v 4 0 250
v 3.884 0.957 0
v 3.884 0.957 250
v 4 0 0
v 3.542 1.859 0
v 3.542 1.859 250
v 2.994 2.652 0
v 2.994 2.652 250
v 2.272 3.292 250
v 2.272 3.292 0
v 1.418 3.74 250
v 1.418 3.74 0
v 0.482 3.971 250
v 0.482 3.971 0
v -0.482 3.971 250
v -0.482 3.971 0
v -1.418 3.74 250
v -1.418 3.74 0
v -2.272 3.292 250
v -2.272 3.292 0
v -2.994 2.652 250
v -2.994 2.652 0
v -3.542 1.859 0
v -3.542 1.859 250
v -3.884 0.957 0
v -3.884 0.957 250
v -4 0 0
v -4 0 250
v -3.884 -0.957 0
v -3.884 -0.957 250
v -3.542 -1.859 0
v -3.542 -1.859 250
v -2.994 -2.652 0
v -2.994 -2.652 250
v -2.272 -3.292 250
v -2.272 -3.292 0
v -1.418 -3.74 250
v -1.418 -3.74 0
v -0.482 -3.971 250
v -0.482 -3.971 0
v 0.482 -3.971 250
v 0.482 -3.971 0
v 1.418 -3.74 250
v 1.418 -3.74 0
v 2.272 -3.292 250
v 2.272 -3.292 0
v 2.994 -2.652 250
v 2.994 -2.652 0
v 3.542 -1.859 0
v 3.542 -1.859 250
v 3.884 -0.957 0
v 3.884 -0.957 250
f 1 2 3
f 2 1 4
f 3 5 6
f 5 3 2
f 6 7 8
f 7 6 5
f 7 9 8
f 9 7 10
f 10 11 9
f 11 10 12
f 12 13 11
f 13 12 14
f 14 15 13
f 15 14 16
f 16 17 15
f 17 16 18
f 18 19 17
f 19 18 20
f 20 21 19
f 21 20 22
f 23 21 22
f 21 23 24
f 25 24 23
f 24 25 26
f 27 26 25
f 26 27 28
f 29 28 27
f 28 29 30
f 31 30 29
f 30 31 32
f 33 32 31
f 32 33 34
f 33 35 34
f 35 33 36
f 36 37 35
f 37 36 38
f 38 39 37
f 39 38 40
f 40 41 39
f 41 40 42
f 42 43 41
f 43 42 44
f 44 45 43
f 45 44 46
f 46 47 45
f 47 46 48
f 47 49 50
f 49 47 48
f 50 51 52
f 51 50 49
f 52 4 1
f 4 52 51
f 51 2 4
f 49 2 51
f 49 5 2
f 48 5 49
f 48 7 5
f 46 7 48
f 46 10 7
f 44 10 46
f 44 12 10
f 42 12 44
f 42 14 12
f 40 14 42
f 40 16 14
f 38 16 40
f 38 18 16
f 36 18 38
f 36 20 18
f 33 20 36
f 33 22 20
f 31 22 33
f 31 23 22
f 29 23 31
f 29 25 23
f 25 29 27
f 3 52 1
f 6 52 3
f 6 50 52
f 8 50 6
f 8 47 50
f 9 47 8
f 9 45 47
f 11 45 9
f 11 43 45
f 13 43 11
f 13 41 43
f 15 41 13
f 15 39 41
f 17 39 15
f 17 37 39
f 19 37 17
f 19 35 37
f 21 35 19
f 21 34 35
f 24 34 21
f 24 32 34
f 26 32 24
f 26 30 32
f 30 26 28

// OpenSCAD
// file: ../config.scad
/*
 * config
 *
 * Copyright 2013 <b@Zi.iS>
 * License CC BY 3.0
 */

$fa = 1;
$fs = 1;
preview = 1;

// preview colors
color_steal = [.8,.8,.8];
color_wood = [.3,.3,0];
color_print = [0,.8,0];

// metric bolt sizes
function m_hole(size) = size*1.1/2;
function m_pilot(size) = size*.9/2;

mounting_bolt = 3;

// slightly move and slightly elongate objects in preview to overcome scad rounding errors
module e() {
	if(preview==1) {
		translate([
			0,
			0,
			-.1
		]) {
			scale([
				1,
				1,
				1.1
			]) {
				child();
			}
		}
	} else {
		child();
	}
}

module m_washer(
	size = 3
) {
	color(color_steal) {
		difference() {
			cylinder(
				r = size/2*2,
				h = size*.2
			);
			e() cylinder(
				r = size/2,
				h = size*.2
			);
		}
	}
	translate([
		0,
		0,
		size*.2
	]) {
		child();
	}
}

module m_nut(
	size = 3
) {
	color(color_steal) {
		difference() {
			cylinder(
				r = size*1.8/2,
				h = size*.8,
				$fn = 6
			);
		}
	}
	translate([
		0,
		0,
		size*.8
	]) {
		child();
	}
}

module m_nylock(
	size = 3
) {
	color(color_steal) {
		difference() {
			cylinder(
				r = size*1.8/2,
				h = size,
				$fn = 6
			);
		}
	}
	translate([
		0,
		0,
		size
	]) {
		child();
	}
}

module screw(
	r = 1,
	h = 1,
	pitch = 5,
) {
	linear_extrude(
		height = h,
		twist = -h/pitch*360
	) {
		translate([pitch/5,0,0]) { //H=.2*p works better in plastic then ISO's H=.866*p
			circle(
				r=r 
			);
		}
	}
}

fan40 = [
	40,			//width/length
	10,			//height
	32,			//bolt pitch
	3,			//bolt
];

lm8uu = [
	15.2/2,	//outside
	8/2,	//inside
	26,		//length
];
// main file
/*
 * rod
 *
 * Copyright 2013 <b@Zi.iS>
 * License CC BY 3.0
 */

include <../config.scad>;

rod();

module rod(
	r = 8/2,
	h = 250
) {
	echo("Smooth rod ", r*2, "mm x ", h, "mm");
	color(color_steal) {
		cylinder(
			r = r,
			h = h
		);
	}
}

module threaded_rod(
	r = 8/2,
	h = 250,
	pitch = 1.26,
) {
	echo("Threaded rod ", r*2, "mm x ", h, "mm");
	color([.7,.7,.7]) {
		cylinder(
			r = r*.8,
			h = h
		);
		%cylinder(
			r = r,
			h = h
		);
	}

	/* Proper version but too slow
	color(color_steal) {
		linear_extrude(
			height = h,
			twist = -h/pitch*360
		) {
			translate([.866*pitch,0,0]) {
				circle(
					r=r 
				);
			}
		}
	}*/
}
